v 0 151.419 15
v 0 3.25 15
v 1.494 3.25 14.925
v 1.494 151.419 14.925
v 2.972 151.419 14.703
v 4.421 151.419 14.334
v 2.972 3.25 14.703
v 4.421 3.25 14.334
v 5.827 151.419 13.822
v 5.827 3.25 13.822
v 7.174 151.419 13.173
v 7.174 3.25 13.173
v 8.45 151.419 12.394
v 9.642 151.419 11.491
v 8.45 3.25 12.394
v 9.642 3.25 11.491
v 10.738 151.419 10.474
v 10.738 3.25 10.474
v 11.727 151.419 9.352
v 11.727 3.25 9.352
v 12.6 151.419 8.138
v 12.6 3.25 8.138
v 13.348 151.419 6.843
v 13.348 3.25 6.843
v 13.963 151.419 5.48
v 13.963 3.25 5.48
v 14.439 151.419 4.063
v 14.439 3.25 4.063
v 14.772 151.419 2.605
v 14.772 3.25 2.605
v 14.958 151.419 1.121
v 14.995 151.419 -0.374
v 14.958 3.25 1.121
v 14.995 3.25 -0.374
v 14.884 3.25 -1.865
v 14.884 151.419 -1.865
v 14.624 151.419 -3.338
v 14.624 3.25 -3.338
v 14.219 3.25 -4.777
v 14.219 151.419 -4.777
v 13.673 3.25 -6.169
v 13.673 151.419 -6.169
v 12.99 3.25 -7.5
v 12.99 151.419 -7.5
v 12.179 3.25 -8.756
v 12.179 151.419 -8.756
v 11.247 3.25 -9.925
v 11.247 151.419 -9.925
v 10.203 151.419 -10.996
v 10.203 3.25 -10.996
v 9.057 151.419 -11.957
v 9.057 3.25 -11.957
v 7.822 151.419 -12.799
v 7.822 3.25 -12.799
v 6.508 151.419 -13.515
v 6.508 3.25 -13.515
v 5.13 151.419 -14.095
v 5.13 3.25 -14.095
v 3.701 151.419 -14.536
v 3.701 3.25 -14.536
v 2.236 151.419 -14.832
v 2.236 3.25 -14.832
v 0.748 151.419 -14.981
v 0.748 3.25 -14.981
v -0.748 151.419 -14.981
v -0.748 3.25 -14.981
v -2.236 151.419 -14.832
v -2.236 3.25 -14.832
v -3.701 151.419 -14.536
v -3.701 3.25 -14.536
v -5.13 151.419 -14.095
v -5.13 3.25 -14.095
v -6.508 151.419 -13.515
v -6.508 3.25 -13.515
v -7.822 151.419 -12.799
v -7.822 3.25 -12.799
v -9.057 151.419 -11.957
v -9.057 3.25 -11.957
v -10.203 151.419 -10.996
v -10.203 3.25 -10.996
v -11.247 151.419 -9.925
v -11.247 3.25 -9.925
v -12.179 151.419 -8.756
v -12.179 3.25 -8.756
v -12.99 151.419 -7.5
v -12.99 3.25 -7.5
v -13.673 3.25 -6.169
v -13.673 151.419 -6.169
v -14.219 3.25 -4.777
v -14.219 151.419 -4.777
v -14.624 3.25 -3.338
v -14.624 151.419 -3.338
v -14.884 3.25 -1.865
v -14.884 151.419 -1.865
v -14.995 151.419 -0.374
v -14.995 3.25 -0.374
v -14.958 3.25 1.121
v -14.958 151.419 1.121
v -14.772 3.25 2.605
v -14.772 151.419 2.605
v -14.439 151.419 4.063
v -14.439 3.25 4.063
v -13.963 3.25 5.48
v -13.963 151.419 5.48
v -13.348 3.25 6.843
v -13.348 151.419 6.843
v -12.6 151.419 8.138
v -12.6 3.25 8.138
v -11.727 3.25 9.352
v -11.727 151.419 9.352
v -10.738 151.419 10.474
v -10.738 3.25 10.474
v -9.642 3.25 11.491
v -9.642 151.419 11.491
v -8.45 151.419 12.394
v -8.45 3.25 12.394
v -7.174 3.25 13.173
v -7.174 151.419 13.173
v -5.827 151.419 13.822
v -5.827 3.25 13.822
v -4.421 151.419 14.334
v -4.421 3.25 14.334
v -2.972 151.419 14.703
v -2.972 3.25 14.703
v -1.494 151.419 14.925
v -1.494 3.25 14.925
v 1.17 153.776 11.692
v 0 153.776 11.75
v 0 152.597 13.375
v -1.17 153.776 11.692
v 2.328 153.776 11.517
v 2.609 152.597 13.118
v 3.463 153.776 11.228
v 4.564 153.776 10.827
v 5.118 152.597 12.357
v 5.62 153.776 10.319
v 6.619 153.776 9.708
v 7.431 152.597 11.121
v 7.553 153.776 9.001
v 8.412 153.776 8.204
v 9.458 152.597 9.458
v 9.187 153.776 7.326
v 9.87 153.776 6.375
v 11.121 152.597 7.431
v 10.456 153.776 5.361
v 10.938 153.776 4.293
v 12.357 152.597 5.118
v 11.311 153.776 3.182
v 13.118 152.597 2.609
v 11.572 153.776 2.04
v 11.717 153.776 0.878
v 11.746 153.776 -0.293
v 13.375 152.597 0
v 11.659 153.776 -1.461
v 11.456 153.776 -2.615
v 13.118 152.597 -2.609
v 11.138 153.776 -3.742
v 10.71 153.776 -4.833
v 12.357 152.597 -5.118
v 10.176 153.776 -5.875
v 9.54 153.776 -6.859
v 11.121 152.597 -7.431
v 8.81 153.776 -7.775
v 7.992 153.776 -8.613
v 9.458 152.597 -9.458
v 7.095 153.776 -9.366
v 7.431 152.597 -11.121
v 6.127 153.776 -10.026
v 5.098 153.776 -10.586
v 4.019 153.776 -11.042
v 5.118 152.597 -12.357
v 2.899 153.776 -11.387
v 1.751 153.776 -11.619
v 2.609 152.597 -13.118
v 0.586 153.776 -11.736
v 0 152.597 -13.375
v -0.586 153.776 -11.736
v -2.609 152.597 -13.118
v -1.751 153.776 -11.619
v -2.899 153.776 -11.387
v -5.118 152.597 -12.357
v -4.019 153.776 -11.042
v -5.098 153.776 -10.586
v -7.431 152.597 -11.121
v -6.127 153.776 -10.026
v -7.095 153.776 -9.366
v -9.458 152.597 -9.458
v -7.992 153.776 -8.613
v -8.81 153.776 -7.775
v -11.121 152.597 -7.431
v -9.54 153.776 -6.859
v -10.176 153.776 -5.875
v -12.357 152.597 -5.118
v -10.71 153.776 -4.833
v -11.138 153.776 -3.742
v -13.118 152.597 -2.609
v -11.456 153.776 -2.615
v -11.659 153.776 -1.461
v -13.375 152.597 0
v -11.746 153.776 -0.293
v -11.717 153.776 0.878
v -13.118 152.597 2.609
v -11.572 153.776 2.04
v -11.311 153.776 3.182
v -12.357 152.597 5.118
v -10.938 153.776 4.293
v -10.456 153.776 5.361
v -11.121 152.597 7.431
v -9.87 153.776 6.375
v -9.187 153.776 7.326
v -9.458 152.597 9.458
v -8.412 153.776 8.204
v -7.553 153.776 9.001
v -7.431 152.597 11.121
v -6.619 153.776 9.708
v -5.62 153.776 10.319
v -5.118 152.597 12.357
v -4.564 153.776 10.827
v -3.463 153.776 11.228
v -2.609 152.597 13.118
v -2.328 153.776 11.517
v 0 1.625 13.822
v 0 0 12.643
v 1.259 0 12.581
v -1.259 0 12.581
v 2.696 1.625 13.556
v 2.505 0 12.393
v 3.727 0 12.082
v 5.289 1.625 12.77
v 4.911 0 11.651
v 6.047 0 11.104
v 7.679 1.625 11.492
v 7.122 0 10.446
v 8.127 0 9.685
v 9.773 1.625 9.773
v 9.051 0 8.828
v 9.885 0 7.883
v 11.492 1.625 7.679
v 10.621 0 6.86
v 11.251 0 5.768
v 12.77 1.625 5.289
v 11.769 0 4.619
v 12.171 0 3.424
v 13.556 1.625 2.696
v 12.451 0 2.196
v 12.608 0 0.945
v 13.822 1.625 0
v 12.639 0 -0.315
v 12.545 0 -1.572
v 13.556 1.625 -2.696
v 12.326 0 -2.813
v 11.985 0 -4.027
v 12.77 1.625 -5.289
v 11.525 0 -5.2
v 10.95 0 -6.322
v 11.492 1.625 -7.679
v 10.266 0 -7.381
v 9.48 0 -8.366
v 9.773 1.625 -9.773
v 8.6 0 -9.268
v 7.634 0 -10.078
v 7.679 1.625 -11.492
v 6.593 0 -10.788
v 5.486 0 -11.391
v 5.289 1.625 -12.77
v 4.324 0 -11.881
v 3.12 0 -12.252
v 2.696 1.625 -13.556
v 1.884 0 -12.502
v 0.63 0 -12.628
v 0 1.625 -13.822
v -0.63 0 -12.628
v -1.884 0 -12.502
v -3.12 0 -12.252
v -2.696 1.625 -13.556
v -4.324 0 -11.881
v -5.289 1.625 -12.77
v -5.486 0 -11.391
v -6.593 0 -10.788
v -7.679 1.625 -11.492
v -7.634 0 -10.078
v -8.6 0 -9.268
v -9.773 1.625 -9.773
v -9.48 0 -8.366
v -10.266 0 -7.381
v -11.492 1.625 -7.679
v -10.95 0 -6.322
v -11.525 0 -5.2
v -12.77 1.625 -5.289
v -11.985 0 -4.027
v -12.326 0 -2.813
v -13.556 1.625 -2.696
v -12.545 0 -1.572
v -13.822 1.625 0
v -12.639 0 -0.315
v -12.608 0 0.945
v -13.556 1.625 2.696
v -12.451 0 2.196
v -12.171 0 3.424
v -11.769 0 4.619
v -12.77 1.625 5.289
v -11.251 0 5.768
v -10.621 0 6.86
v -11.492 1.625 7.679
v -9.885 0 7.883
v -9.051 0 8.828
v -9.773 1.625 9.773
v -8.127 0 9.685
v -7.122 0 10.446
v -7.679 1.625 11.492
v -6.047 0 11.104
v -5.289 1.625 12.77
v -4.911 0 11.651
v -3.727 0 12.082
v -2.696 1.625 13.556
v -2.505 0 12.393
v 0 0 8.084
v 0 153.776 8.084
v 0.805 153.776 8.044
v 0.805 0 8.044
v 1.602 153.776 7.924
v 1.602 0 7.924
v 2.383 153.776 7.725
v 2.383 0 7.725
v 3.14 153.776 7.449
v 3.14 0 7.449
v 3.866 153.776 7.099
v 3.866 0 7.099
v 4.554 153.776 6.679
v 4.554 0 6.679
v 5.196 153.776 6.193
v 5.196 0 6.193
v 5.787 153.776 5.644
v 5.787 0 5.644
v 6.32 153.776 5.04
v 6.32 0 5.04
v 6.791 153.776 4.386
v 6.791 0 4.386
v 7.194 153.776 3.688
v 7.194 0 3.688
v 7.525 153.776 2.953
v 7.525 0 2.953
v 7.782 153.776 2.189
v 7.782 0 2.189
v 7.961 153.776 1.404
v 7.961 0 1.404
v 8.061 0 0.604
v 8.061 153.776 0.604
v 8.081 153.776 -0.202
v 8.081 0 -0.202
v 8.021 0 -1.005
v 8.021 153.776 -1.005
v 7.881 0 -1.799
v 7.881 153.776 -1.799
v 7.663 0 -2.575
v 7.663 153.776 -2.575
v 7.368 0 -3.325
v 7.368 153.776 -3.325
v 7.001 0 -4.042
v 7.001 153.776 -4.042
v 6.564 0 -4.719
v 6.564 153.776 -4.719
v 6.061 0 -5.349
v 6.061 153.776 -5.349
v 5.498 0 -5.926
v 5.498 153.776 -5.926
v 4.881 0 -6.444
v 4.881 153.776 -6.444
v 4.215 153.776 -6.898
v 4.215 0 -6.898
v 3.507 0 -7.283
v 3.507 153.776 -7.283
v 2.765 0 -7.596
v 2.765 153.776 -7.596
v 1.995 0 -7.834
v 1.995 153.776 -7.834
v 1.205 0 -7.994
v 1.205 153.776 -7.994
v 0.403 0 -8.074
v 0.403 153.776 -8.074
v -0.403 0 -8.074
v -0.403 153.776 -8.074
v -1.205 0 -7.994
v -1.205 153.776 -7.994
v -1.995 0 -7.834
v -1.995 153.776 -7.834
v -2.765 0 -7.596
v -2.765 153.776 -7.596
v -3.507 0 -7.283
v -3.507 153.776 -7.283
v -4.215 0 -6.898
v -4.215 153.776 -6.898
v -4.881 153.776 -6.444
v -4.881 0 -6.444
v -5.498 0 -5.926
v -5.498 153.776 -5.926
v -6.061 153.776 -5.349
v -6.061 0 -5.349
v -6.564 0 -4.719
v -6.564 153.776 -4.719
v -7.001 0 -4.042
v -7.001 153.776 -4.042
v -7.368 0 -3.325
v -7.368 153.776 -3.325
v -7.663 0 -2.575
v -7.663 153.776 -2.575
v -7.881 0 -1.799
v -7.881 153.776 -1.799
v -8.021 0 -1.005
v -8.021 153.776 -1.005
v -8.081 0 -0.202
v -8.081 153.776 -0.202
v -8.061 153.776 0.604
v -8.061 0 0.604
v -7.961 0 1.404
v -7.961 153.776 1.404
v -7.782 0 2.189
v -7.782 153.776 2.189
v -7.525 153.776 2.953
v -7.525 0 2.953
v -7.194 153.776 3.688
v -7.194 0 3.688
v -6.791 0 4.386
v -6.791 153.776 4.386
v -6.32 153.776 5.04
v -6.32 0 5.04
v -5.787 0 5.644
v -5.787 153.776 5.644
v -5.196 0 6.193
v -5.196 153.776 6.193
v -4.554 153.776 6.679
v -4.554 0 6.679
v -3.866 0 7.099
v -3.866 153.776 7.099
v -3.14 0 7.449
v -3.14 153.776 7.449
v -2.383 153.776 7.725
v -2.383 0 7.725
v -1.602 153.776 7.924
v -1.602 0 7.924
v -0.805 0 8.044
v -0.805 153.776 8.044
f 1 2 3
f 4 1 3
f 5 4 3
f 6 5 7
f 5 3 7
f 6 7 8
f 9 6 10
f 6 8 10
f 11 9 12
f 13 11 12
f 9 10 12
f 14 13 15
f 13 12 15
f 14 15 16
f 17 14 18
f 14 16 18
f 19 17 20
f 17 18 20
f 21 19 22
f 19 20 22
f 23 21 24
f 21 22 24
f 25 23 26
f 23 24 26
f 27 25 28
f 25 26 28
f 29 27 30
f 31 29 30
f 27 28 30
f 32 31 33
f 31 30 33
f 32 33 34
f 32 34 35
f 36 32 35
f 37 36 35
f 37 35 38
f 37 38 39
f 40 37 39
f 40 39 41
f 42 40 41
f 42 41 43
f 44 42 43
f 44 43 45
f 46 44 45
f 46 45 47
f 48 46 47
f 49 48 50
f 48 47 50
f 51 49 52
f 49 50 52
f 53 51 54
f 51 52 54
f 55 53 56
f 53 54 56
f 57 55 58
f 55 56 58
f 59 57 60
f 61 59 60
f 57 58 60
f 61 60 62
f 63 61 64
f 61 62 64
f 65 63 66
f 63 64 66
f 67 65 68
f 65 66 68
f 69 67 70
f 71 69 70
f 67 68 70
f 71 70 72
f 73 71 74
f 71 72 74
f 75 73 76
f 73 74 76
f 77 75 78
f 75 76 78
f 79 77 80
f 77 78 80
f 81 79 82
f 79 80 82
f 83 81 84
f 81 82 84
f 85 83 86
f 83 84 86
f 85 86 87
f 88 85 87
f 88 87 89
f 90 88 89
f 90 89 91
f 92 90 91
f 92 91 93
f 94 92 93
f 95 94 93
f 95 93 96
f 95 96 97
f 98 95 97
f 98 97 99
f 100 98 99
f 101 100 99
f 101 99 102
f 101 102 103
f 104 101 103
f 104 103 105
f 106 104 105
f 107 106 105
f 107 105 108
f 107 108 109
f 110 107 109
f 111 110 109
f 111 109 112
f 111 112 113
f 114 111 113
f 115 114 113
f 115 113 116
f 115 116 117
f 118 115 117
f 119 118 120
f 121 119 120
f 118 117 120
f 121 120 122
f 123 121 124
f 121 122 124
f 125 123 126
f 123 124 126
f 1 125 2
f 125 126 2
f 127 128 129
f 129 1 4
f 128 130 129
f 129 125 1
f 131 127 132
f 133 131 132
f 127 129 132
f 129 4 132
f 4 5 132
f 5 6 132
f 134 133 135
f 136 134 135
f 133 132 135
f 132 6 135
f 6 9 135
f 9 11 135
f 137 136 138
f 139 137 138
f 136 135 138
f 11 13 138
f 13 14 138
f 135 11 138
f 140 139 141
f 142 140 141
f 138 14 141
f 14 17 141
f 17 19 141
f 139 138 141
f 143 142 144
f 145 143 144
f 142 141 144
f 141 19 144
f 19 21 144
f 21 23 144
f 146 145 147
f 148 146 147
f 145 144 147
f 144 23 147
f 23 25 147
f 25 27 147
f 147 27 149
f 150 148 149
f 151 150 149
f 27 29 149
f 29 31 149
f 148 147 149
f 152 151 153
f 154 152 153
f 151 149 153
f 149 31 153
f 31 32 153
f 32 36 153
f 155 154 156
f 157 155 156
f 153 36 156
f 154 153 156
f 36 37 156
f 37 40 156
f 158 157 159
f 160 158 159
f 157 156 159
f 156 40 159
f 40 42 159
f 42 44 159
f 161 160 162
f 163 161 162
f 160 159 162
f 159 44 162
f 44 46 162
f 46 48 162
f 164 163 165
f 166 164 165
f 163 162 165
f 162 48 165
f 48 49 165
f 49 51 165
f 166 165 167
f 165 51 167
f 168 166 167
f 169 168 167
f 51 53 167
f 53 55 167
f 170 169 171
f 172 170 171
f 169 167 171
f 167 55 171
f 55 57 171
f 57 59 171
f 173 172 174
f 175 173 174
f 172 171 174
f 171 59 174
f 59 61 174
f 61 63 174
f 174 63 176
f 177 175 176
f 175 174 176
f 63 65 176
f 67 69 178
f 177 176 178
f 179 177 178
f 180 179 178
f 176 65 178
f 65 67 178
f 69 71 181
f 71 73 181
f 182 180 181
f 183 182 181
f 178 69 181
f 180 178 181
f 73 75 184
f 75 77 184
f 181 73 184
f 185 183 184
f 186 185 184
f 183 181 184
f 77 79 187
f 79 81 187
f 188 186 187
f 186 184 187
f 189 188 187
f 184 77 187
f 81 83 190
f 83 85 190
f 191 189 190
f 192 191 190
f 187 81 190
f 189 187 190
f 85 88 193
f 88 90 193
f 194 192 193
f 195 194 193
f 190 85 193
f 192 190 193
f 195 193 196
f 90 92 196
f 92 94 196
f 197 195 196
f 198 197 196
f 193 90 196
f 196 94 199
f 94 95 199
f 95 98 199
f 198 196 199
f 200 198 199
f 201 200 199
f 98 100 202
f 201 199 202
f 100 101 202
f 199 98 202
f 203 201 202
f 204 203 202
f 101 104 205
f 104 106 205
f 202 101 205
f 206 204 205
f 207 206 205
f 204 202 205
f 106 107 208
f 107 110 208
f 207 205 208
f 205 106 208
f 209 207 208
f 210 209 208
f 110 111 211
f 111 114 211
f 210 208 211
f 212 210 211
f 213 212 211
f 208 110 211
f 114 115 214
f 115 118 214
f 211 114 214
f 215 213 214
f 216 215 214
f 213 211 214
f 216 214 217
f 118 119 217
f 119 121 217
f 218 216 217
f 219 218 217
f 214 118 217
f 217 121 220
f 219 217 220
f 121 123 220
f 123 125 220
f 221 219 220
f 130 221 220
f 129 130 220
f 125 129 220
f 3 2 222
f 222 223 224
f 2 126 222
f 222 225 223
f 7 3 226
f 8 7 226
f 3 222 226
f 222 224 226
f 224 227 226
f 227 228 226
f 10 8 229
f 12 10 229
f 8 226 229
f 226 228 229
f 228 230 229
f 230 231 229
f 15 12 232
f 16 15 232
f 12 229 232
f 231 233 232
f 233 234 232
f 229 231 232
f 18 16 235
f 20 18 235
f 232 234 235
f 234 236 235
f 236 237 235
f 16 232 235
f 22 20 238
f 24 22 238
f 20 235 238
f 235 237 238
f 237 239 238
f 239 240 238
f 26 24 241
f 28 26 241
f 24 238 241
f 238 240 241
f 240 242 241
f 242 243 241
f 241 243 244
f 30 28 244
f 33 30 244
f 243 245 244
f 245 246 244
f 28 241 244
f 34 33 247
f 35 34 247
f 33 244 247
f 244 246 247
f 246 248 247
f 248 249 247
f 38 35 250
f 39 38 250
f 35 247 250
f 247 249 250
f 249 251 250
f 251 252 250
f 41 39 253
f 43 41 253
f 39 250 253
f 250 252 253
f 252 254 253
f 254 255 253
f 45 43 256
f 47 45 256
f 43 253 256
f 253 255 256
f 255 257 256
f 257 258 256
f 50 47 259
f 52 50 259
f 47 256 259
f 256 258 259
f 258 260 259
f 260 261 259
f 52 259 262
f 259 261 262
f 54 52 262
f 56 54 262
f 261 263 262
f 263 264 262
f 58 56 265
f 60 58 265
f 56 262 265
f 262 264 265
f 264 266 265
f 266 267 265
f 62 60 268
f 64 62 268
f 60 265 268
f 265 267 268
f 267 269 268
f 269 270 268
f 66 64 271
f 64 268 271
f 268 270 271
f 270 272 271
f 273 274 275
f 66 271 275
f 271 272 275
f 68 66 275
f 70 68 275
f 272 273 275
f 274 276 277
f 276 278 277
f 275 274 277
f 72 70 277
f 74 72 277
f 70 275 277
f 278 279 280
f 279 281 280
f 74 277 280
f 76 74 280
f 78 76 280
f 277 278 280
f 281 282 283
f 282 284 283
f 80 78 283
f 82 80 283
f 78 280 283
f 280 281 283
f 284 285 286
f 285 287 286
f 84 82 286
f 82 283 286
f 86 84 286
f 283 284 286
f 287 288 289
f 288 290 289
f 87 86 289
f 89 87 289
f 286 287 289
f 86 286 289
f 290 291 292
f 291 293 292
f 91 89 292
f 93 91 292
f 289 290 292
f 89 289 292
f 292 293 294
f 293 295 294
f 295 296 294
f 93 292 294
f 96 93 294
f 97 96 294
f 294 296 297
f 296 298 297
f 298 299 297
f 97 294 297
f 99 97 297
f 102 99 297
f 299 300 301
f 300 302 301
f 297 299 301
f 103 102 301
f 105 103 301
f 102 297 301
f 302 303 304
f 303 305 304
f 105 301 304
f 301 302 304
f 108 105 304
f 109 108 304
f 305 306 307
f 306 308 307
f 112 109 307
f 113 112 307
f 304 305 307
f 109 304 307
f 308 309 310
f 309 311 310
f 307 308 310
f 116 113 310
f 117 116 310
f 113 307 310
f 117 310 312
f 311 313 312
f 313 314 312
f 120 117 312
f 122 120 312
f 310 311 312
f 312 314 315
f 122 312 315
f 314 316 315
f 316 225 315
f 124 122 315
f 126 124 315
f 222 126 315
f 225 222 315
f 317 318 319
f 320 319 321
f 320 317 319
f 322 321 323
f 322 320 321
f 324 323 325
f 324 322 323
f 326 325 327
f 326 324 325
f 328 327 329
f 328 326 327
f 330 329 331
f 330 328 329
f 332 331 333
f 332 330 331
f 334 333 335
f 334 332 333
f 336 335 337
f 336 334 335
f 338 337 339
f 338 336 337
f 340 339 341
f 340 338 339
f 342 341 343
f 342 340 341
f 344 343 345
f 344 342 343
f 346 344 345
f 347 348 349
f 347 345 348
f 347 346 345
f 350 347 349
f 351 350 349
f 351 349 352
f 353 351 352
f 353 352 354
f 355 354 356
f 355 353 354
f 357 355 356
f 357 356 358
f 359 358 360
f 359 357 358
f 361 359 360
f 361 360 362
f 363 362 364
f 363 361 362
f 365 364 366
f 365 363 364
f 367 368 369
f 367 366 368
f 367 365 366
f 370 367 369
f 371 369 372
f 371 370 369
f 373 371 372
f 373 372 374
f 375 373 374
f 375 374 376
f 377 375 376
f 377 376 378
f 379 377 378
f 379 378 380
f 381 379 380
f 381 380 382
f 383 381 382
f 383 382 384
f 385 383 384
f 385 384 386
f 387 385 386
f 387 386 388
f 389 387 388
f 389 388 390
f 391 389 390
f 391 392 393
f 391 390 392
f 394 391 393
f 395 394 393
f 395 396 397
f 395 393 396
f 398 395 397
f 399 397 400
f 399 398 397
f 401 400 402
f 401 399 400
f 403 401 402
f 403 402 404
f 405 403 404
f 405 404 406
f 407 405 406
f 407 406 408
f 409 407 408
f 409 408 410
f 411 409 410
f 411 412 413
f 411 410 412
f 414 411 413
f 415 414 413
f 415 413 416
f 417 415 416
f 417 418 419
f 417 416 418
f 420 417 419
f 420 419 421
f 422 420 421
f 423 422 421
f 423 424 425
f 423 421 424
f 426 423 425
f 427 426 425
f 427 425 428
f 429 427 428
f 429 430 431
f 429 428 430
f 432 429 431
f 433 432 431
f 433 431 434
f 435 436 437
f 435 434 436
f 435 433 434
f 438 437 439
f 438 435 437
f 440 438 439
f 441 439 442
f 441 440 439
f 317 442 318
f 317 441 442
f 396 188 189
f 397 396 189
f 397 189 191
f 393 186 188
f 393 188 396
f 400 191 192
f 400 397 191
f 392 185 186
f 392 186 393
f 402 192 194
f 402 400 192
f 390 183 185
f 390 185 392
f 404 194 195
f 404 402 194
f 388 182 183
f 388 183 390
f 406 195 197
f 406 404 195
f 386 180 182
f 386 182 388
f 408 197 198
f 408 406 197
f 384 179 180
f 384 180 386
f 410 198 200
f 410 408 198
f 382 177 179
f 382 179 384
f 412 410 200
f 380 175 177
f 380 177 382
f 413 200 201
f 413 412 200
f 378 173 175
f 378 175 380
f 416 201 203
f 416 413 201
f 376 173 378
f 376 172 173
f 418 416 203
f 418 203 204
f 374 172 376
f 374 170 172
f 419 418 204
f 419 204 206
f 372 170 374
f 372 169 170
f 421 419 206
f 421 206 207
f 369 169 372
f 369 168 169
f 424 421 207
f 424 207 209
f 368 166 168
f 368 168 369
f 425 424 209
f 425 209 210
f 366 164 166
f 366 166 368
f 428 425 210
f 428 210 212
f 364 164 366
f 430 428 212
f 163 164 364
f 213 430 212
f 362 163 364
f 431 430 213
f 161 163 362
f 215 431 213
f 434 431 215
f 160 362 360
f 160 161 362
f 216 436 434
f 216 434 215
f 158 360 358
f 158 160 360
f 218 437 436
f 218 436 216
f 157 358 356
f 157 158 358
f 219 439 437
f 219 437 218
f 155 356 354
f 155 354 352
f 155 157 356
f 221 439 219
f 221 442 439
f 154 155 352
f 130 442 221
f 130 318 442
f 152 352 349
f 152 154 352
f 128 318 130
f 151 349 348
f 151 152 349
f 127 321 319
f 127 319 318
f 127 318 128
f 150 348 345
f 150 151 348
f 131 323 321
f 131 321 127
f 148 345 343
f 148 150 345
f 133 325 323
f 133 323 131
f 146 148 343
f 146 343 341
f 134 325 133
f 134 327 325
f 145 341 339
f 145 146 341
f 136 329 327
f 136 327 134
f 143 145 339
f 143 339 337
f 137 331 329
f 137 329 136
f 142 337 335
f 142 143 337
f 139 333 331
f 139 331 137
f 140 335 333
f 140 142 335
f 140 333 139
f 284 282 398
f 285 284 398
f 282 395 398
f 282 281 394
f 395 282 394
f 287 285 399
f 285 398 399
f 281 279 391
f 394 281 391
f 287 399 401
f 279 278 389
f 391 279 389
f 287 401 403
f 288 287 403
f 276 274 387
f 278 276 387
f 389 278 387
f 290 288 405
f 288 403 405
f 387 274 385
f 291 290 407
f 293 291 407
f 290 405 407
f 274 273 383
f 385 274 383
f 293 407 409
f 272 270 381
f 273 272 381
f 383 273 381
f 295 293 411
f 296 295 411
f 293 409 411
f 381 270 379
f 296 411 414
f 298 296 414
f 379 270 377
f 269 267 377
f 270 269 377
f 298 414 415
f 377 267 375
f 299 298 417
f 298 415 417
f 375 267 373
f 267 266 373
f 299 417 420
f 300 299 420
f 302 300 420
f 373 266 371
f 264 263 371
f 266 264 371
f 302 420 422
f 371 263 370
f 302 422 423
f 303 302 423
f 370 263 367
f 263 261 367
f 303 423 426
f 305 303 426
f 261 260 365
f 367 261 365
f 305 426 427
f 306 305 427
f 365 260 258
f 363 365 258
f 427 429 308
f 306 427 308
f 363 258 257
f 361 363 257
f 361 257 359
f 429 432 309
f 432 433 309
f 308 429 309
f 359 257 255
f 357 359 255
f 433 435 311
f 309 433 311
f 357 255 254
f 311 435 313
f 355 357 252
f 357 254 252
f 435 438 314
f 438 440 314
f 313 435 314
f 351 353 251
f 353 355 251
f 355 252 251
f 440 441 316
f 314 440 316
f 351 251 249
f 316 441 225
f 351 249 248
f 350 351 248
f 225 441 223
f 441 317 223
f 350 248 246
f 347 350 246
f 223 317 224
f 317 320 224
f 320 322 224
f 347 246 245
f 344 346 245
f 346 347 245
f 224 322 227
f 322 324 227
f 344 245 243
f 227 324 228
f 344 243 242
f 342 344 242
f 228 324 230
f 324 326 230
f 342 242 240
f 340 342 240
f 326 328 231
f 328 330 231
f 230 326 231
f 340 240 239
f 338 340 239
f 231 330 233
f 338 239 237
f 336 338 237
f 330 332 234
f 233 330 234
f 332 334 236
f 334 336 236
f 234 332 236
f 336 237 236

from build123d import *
from OCP.BRepFilletAPI import BRepFilletAPI_MakeChamfer

# Parameters (mm, degrees)
SKETCH1_R           = 15
BOSS_EXTRUDE1_DEPTH = 153.775560712
SKETCH2_R           = 8.083843349
CUT_EXTRUDE1_DEPTH  = 156.23183653
CHAMFER1_SIZE       = 2.356600441
CHAMFER1_SIZE2      = 3.249874134


with BuildPart() as part:
    # Sketch1 → Boss-Extrude1 (new body)
    with BuildSketch(Plane(origin=(0, 0, 0), x_dir=(1, 0, 0), z_dir=(0, 1, 0))):
        Circle(SKETCH1_R)
    extrude(amount=BOSS_EXTRUDE1_DEPTH)

    # Sketch2 → Cut-Extrude1 (cut, through all)
    with BuildSketch(Plane(origin=(0, 0, 0), x_dir=(1, 0, 0), z_dir=(0, 1, 0))):
        Circle(SKETCH2_R)
    extrude(amount=CUT_EXTRUDE1_DEPTH, mode=Mode.SUBTRACT)

    # Chamfer1: one chamfer whose edges measure the first distance from different faces: ONE call of the kernel's chamfer builder (chamfer() names one face for all edges)
    chamfer1_edges_1 = [part.edges().sort_by_distance(p)[0] for p in [
        (-15, 153.775560712, 0),
    ]]
    chamfer1_side_1 = [part.faces().sort_by_distance(p)[0] for p in [
        (-15, 76.887780356, 0),
    ]]
    chamfer1_edges_2 = [part.edges().sort_by_distance(p)[0] for p in [
        (-15, 0, 0),
    ]]
    chamfer1_side_2 = [part.faces().sort_by_distance(p)[0] for p in [
        (-14.575735931, 0, 0),
    ]]
    chamfer1 = BRepFilletAPI_MakeChamfer(part.part.solid().wrapped)
    for e in chamfer1_edges_1:
        chamfer1.Add(CHAMFER1_SIZE, CHAMFER1_SIZE2, e.wrapped, chamfer1_side_1[0].wrapped)  # the first distance lies on this face
    for e in chamfer1_edges_2:
        chamfer1.Add(CHAMFER1_SIZE, CHAMFER1_SIZE2, e.wrapped, chamfer1_side_2[0].wrapped)  # the first distance lies on this face
    add(Compound.cast(chamfer1.Shape()), mode=Mode.REPLACE)


solid = part.part
